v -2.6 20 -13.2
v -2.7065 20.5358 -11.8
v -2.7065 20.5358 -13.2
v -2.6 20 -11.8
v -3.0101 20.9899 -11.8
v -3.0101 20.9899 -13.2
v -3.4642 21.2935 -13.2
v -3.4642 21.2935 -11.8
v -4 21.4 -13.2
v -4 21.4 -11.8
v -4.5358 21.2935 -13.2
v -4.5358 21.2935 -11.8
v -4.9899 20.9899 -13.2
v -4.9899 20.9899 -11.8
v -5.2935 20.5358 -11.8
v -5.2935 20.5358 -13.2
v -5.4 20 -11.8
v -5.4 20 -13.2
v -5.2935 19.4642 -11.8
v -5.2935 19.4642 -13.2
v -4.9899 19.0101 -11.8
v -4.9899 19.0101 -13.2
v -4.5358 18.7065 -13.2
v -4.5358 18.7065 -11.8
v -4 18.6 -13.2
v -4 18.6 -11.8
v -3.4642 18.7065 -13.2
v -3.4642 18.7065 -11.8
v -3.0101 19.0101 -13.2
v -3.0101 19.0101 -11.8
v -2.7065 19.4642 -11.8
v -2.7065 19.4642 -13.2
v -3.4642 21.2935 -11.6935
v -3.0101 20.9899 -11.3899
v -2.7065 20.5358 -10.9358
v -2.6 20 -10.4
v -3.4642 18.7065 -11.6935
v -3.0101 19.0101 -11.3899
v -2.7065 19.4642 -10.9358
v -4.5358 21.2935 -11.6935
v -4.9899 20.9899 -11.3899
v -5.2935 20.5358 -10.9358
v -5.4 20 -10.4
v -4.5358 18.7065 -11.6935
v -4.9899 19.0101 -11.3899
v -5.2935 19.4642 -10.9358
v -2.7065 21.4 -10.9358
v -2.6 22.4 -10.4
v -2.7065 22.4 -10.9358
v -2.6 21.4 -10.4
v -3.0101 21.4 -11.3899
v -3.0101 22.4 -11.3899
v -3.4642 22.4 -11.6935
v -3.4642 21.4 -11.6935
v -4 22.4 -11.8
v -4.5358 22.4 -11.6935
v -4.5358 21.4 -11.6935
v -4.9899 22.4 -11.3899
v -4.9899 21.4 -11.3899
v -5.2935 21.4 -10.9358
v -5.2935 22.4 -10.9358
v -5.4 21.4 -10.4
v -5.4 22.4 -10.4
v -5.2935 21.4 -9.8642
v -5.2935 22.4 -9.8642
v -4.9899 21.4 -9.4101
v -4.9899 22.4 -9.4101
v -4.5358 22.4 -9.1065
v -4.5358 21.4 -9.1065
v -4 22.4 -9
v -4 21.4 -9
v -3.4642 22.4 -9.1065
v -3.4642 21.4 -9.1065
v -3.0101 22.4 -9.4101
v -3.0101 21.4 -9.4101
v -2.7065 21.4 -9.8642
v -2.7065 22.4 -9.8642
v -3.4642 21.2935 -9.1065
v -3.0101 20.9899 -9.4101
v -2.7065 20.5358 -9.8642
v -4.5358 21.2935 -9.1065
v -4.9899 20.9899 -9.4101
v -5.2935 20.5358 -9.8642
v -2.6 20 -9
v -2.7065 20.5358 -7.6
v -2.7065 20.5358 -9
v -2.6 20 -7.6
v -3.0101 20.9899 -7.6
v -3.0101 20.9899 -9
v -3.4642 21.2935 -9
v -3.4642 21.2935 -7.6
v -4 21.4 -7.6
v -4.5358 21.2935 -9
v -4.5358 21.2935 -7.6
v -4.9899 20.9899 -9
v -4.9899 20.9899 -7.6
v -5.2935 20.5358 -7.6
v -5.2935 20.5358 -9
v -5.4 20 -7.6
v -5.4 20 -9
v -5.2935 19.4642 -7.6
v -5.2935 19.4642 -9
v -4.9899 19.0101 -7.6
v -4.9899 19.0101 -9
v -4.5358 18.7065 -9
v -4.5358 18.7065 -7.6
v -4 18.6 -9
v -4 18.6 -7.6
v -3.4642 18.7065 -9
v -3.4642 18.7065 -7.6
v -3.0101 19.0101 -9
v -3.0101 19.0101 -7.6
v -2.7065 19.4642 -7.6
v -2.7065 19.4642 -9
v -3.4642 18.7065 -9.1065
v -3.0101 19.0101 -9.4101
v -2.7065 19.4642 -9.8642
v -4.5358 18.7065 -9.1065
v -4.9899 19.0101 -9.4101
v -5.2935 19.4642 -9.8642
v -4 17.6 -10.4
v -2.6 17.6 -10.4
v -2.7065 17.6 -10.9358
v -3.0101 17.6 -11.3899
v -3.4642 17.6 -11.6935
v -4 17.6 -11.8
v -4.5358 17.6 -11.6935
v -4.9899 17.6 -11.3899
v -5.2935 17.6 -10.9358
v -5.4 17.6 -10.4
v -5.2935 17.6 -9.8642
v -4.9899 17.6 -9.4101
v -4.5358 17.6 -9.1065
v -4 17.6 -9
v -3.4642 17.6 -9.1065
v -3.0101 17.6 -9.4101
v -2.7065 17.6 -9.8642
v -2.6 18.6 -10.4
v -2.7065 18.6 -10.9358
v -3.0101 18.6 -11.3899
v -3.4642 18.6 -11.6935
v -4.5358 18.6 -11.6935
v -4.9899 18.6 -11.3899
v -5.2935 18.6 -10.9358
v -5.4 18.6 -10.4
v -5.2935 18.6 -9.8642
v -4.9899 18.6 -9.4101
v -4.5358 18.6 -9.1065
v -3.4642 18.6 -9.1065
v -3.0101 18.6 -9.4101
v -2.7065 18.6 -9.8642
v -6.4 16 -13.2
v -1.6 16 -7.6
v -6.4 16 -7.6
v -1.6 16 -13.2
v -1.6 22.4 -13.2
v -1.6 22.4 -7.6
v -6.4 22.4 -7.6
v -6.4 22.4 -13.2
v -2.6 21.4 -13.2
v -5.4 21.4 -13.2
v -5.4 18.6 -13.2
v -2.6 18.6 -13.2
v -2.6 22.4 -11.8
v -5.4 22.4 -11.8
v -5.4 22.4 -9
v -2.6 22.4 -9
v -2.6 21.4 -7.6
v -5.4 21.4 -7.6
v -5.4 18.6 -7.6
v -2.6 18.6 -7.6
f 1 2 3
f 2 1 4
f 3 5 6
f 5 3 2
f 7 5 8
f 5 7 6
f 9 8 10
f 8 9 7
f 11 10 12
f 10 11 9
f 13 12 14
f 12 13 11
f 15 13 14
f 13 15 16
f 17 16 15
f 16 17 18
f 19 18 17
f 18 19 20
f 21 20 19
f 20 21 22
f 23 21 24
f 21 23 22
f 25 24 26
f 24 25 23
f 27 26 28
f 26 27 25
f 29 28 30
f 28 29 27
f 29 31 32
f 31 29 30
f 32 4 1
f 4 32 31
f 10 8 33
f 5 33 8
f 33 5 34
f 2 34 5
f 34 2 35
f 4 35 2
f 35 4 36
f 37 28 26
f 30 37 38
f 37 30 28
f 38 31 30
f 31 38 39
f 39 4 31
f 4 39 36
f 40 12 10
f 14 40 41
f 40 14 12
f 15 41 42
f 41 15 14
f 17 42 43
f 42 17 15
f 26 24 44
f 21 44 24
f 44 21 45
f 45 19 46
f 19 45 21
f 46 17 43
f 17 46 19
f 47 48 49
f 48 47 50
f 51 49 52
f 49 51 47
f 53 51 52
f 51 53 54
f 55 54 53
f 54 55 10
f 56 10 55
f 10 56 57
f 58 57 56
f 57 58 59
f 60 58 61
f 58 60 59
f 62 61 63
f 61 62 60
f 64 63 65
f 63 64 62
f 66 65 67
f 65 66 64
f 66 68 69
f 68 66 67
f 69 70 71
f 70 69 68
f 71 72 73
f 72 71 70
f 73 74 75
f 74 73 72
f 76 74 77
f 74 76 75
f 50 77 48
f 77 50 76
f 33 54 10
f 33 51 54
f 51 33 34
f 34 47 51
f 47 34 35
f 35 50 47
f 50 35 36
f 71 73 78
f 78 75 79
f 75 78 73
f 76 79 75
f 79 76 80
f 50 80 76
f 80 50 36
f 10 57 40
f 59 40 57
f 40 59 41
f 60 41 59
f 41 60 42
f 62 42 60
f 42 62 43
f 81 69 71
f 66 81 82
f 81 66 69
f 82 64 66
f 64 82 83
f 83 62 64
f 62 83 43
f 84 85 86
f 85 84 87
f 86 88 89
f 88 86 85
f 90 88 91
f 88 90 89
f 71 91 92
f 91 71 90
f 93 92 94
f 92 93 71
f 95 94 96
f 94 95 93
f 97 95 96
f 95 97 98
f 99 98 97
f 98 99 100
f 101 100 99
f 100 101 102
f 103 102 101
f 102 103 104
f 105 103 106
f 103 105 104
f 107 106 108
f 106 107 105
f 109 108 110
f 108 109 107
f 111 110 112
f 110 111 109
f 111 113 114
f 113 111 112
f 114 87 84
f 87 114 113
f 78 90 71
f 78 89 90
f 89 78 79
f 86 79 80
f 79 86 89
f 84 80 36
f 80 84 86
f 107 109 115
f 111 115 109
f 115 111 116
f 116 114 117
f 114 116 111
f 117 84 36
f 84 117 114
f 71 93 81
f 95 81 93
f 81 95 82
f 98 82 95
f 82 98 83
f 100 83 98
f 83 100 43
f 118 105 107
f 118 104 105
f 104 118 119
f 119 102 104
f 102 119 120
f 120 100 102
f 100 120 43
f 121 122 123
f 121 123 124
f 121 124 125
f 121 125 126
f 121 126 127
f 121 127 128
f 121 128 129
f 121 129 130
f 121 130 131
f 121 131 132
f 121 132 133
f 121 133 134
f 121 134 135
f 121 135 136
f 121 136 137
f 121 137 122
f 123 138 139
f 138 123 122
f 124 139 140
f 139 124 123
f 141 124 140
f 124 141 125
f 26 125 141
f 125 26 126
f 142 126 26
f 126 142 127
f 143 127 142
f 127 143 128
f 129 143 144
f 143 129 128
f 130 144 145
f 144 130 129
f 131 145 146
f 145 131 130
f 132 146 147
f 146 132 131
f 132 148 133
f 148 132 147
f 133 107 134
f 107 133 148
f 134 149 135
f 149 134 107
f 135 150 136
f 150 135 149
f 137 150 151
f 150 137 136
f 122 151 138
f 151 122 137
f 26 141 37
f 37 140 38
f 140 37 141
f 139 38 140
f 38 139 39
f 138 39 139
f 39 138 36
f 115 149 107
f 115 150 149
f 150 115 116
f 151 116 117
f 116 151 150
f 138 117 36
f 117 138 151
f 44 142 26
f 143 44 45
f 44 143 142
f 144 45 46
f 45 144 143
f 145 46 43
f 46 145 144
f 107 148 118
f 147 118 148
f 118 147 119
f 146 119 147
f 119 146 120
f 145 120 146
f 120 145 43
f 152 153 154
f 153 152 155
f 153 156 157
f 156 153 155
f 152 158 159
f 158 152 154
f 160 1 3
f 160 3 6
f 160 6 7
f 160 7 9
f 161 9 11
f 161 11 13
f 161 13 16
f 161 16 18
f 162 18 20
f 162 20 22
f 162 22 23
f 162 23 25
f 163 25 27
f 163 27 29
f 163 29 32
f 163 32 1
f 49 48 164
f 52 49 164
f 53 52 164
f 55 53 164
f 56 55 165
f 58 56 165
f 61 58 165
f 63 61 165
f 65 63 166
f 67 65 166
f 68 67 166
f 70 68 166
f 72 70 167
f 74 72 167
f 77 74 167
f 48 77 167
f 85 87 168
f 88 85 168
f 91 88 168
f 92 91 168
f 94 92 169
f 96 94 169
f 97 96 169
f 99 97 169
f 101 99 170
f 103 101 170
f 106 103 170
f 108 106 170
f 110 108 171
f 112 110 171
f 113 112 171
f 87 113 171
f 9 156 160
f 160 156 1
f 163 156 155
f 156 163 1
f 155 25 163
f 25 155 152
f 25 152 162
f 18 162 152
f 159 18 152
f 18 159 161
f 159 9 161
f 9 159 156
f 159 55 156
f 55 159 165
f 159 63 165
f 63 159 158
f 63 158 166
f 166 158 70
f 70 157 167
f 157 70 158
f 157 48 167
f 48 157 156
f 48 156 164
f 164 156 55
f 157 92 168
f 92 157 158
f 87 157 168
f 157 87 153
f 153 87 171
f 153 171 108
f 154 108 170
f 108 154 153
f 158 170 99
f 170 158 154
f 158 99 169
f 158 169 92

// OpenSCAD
// file: ../../p/box3u2p.scad
use <../lib.scad>
function ldraw_lib__box3u2p() = [
// 0 Box with 3 Faces without 2 Parallel Edges
// 0 Name: box3u2p.dat
// 0 Author: Niels Karsdorp [nielsk]
// 0 !LDRAW_ORG Primitive UPDATE 2012-01
// 0 !LICENSE Licensed under CC BY 4.0 : see CAreadme.txt
// 
// 0 BFC CERTIFY CCW
  [0,"BFC","CERTIFY"],
  [0,"BFC","CCW"],
// 
// 0 !HISTORY 2003-03-12 [PTadmin] Official Update 2003-01
// 0 !HISTORY 2007-06-24 [PTadmin] Header formatted for Contributor Agreement
// 0 !HISTORY 2008-07-01 [PTadmin] Official Update 2008-01
// 0 !HISTORY 2012-02-16 [Philo] Changed to CCW
// 0 !HISTORY 2012-03-30 [PTadmin] Official Update 2012-01
// 
// 
// 2 24 1 1 1 -1 1 1
  [2,24,1,1,1,-1,1,1],
// 2 24 -1 1 -1 1 1 -1
  [2,24,-1,1,-1,1,1,-1],
// 2 24 1 0 1 -1 0 1
  [2,24,1,0,1,-1,0,1],
// 2 24 -1 0 -1 1 0 -1
  [2,24,-1,0,-1,1,0,-1],
// 2 24 1 1 1 1 1 -1
  [2,24,1,1,1,1,1,-1],
// 2 24 -1 1 1 -1 1 -1
  [2,24,-1,1,1,-1,1,-1],
// 2 24 1 1 1 1 0 1
  [2,24,1,1,1,1,0,1],
// 2 24 1 1 -1 1 0 -1
  [2,24,1,1,-1,1,0,-1],
// 2 24 -1 1 1 -1 0 1
  [2,24,-1,1,1,-1,0,1],
// 2 24 -1 1 -1 -1 0 -1
  [2,24,-1,1,-1,-1,0,-1],
// 4 16 -1 1 -1 -1 1 1 1 1 1 1 1 -1
  [4,16,-1,1,-1,-1,1,1,1,1,1,1,1,-1],
// 4 16 -1 1 1 -1 0 1 1 0 1 1 1 1
  [4,16,-1,1,1,-1,0,1,1,0,1,1,1,1],
// 4 16 1 1 -1 1 0 -1 -1 0 -1 -1 1 -1
  [4,16,1,1,-1,1,0,-1,-1,0,-1,-1,1,-1],
];
module ldraw_lib__box3u2p(step=0, col=false, unit=2/5, alt=false, line=0.2, solid=!$preview)
    makepoly(ldraw_lib__box3u2p(), step=step, col=col, unit=unit, alt=alt, line=line, solid=solid);
ldraw_lib__box3u2p(line=0.2);
// file: ../../p/4-4ndis.scad
use <../lib.scad>
function ldraw_lib__4_4ndis() = [
// 0 Disc Negative 1.0
// 0 Name: 4-4ndis.dat
// 0 Author: James Jessiman
// 0 !LDRAW_ORG Primitive UPDATE 2012-01
// 0 !LICENSE Licensed under CC BY 4.0 : see CAreadme.txt
// 
// 0 BFC CERTIFY CCW
  [0,"BFC","CERTIFY"],
  [0,"BFC","CCW"],
// 
// 0 !HISTORY 2002-03-23 [sbliss] Added BFC statement; compacted code
// 0 !HISTORY 2002-04-25 [PTadmin] Official Update 2002-02
// 0 !HISTORY 2007-06-24 [PTadmin] Header formatted for Contributor Agreement
// 0 !HISTORY 2008-07-01 [PTadmin] Official Update 2008-01
// 0 !HISTORY 2012-02-16 [Philo] Changed to CCW
// 0 !HISTORY 2012-03-30 [PTadmin] Official Update 2012-01
// 
// 
// 3 16 0.9239 0 0.3827 1 0 0 1 0 1
  [3,16,0.9239,0,0.3827,1,0,0,1,0,1],
// 3 16 0.7071 0 0.7071 0.9239 0 0.3827 1 0 1
  [3,16,0.7071,0,0.7071,0.9239,0,0.3827,1,0,1],
// 3 16 0.3827 0 0.9239 0.7071 0 0.7071 1 0 1
  [3,16,0.3827,0,0.9239,0.7071,0,0.7071,1,0,1],
// 3 16 0 0 1 0.3827 0 0.9239 1 0 1
  [3,16,0,0,1,0.3827,0,0.9239,1,0,1],
// 3 16 -0.3827 0 0.9239 0 0 1 -1 0 1
  [3,16,-0.3827,0,0.9239,0,0,1,-1,0,1],
// 3 16 -0.7071 0 0.7071 -0.3827 0 0.9239 -1 0 1
  [3,16,-0.7071,0,0.7071,-0.3827,0,0.9239,-1,0,1],
// 3 16 -0.9239 0 0.3827 -0.7071 0 0.7071 -1 0 1
  [3,16,-0.9239,0,0.3827,-0.7071,0,0.7071,-1,0,1],
// 3 16 -1 0 0 -0.9239 0 0.3827 -1 0 1
  [3,16,-1,0,0,-0.9239,0,0.3827,-1,0,1],
// 3 16 -0.9239 0 -0.3827 -1 0 0 -1 0 -1
  [3,16,-0.9239,0,-0.3827,-1,0,0,-1,0,-1],
// 3 16 -0.7071 0 -0.7071 -0.9239 0 -0.3827 -1 0 -1
  [3,16,-0.7071,0,-0.7071,-0.9239,0,-0.3827,-1,0,-1],
// 3 16 -0.3827 0 -0.9239 -0.7071 0 -0.7071 -1 0 -1
  [3,16,-0.3827,0,-0.9239,-0.7071,0,-0.7071,-1,0,-1],
// 3 16 0 0 -1 -0.3827 0 -0.9239 -1 0 -1
  [3,16,0,0,-1,-0.3827,0,-0.9239,-1,0,-1],
// 3 16 0.3827 0 -0.9239 0 0 -1 1 0 -1
  [3,16,0.3827,0,-0.9239,0,0,-1,1,0,-1],
// 3 16 0.7071 0 -0.7071 0.3827 0 -0.9239 1 0 -1
  [3,16,0.7071,0,-0.7071,0.3827,0,-0.9239,1,0,-1],
// 3 16 0.9239 0 -0.3827 0.7071 0 -0.7071 1 0 -1
  [3,16,0.9239,0,-0.3827,0.7071,0,-0.7071,1,0,-1],
// 3 16 1 0 0 0.9239 0 -0.3827 1 0 -1
  [3,16,1,0,0,0.9239,0,-0.3827,1,0,-1],
];
module ldraw_lib__4_4ndis(step=0, col=false, unit=2/5, alt=false, line=0.2, solid=!$preview)
    makepoly(ldraw_lib__4_4ndis(), step=step, col=col, unit=unit, alt=alt, line=line, solid=solid);
ldraw_lib__4_4ndis(line=0.2);
// file: ../../p/4-4edge.scad
use <../lib.scad>
function ldraw_lib__4_4edge() = [
// 0 Circle 1.0
// 0 Name: 4-4edge.dat
// 0 Author: James Jessiman
// 0 !LDRAW_ORG Primitive UPDATE 2017-01
// 0 !LICENSE Licensed under CC BY 4.0 : see CAreadme.txt
// 
// 0 BFC CERTIFY CCW
  [0,"BFC","CERTIFY"],
  [0,"BFC","CCW"],
// 
// 0 !HISTORY 1998-12-15 [PTadmin] Official Update 1998-10
// 0 !HISTORY 2005-12-28 [PTadmin] Official Update 2005-01
// 0 !HISTORY 2007-06-24 [PTadmin] Header formatted for Contributor Agreement
// 0 !HISTORY 2008-07-01 [PTadmin] Official Update 2008-01
// 0 !HISTORY 2017-01-15 [Steffen] BFCed
// 0 !HISTORY 2017-12-30 [PTadmin] Official Update 2017-01
// 
// 
// 2 24 1 0 0 0.9239 0 0.3827
  [2,24,1,0,0,0.9239,0,0.3827],
// 2 24 0.9239 0 0.3827 0.7071 0 0.7071
  [2,24,0.9239,0,0.3827,0.7071,0,0.7071],
// 2 24 0.7071 0 0.7071 0.3827 0 0.9239
  [2,24,0.7071,0,0.7071,0.3827,0,0.9239],
// 2 24 0.3827 0 0.9239 0 0 1
  [2,24,0.3827,0,0.9239,0,0,1],
// 2 24 0 0 1 -0.3827 0 0.9239
  [2,24,0,0,1,-0.3827,0,0.9239],
// 2 24 -0.3827 0 0.9239 -0.7071 0 0.7071
  [2,24,-0.3827,0,0.9239,-0.7071,0,0.7071],
// 2 24 -0.7071 0 0.7071 -0.9239 0 0.3827
  [2,24,-0.7071,0,0.7071,-0.9239,0,0.3827],
// 2 24 -0.9239 0 0.3827 -1 0 -0
  [2,24,-0.9239,0,0.3827,-1,0,-0],
// 2 24 -1 0 -0 -0.9239 0 -0.3827
  [2,24,-1,0,-0,-0.9239,0,-0.3827],
// 2 24 -0.9239 0 -0.3827 -0.7071 0 -0.7071
  [2,24,-0.9239,0,-0.3827,-0.7071,0,-0.7071],
// 2 24 -0.7071 0 -0.7071 -0.3827 0 -0.9239
  [2,24,-0.7071,0,-0.7071,-0.3827,0,-0.9239],
// 2 24 -0.3827 0 -0.9239 0 0 -1
  [2,24,-0.3827,0,-0.9239,0,0,-1],
// 2 24 0 0 -1 0.3827 0 -0.9239
  [2,24,0,0,-1,0.3827,0,-0.9239],
// 2 24 0.3827 0 -0.9239 0.7071 0 -0.7071
  [2,24,0.3827,0,-0.9239,0.7071,0,-0.7071],
// 2 24 0.7071 0 -0.7071 0.9239 0 -0.3827
  [2,24,0.7071,0,-0.7071,0.9239,0,-0.3827],
// 2 24 0.9239 0 -0.3827 1 0 0
  [2,24,0.9239,0,-0.3827,1,0,0],
];
module ldraw_lib__4_4edge(step=0, col=false, unit=2/5, alt=false, line=0.2, solid=!$preview)
    makepoly(ldraw_lib__4_4edge(), step=step, col=col, unit=unit, alt=alt, line=line, solid=solid);
ldraw_lib__4_4edge(line=0.2);
// file: ../../p/4-4disc.scad
use <../lib.scad>
function ldraw_lib__4_4disc() = [
// 0 Disc 1.0
// 0 Name: 4-4disc.dat
// 0 Author: James Jessiman
// 0 !LDRAW_ORG Primitive UPDATE 2002-02
// 0 !LICENSE Licensed under CC BY 4.0 : see CAreadme.txt
// 
// 0 BFC CERTIFY CCW
  [0,"BFC","CERTIFY"],
  [0,"BFC","CCW"],
// 
// 0 !HISTORY 1998-12-15 [PTadmin] Official Update 1998-10
// 0 !HISTORY 2002-03-23 [sbliss] Added BFC statement
// 0 !HISTORY 2002-04-25 [PTadmin] Official Update 2002-02
// 0 !HISTORY 2007-06-24 [PTadmin] Header formatted for Contributor Agreement
// 0 !HISTORY 2008-07-01 [PTadmin] Official Update 2008-01
// 
// 
// 3 16 0 0 0 1 0 0 0.9239 0 0.3827
  [3,16,0,0,0,1,0,0,0.9239,0,0.3827],
// 3 16 0 0 0 0.9239 0 0.3827 0.7071 0 0.7071
  [3,16,0,0,0,0.9239,0,0.3827,0.7071,0,0.7071],
// 3 16 0 0 0 0.7071 0 0.7071 0.3827 0 0.9239
  [3,16,0,0,0,0.7071,0,0.7071,0.3827,0,0.9239],
// 3 16 0 0 0 0.3827 0 0.9239 0 0 1
  [3,16,0,0,0,0.3827,0,0.9239,0,0,1],
// 3 16 0 0 0 0 0 1 -0.3827 0 0.9239
  [3,16,0,0,0,0,0,1,-0.3827,0,0.9239],
// 3 16 0 0 0 -0.3827 0 0.9239 -0.7071 0 0.7071
  [3,16,0,0,0,-0.3827,0,0.9239,-0.7071,0,0.7071],
// 3 16 0 0 0 -0.7071 0 0.7071 -0.9239 0 0.3827
  [3,16,0,0,0,-0.7071,0,0.7071,-0.9239,0,0.3827],
// 3 16 0 0 0 -0.9239 0 0.3827 -1 0 -0
  [3,16,0,0,0,-0.9239,0,0.3827,-1,0,-0],
// 3 16 0 0 0 -1 0 -0 -0.9239 0 -0.3827
  [3,16,0,0,0,-1,0,-0,-0.9239,0,-0.3827],
// 3 16 0 0 0 -0.9239 0 -0.3827 -0.7071 0 -0.7071
  [3,16,0,0,0,-0.9239,0,-0.3827,-0.7071,0,-0.7071],
// 3 16 0 0 0 -0.7071 0 -0.7071 -0.3827 0 -0.9239
  [3,16,0,0,0,-0.7071,0,-0.7071,-0.3827,0,-0.9239],
// 3 16 0 0 0 -0.3827 0 -0.9239 0 0 -1
  [3,16,0,0,0,-0.3827,0,-0.9239,0,0,-1],
// 3 16 0 0 0 0 0 -1 0.3827 0 -0.9239
  [3,16,0,0,0,0,0,-1,0.3827,0,-0.9239],
// 3 16 0 0 0 0.3827 0 -0.9239 0.7071 0 -0.7071
  [3,16,0,0,0,0.3827,0,-0.9239,0.7071,0,-0.7071],
// 3 16 0 0 0 0.7071 0 -0.7071 0.9239 0 -0.3827
  [3,16,0,0,0,0.7071,0,-0.7071,0.9239,0,-0.3827],
// 3 16 0 0 0 0.9239 0 -0.3827 1 0 0
  [3,16,0,0,0,0.9239,0,-0.3827,1,0,0],
// 0
];
module ldraw_lib__4_4disc(step=0, col=false, unit=2/5, alt=false, line=0.2, solid=!$preview)
    makepoly(ldraw_lib__4_4disc(), step=step, col=col, unit=unit, alt=alt, line=line, solid=solid);
ldraw_lib__4_4disc(line=0.2);
// file: ../../p/4-4cyli.scad
use <../lib.scad>
function ldraw_lib__4_4cyli() = [
// 0 Cylinder 1.0
// 0 Name: 4-4cyli.dat
// 0 Author: James Jessiman
// 0 !LDRAW_ORG Primitive UPDATE 2005-01
// 0 !LICENSE Licensed under CC BY 4.0 : see CAreadme.txt
// 
// 0 BFC CERTIFY CCW
  [0,"BFC","CERTIFY"],
  [0,"BFC","CCW"],
// 
// 0 !HISTORY 1998-12-15 [PTadmin] Official Update 1998-10
// 0 !HISTORY 2002-03-23 [sbliss] Added BFC statement; merged headers from files in distributions LDraw 0.27 and Complete.
// 0 !HISTORY 2002-04-25 [PTadmin] Official Update 2002-02
// 0 !HISTORY 2004-12-14 [guyvivan] BFC CCW
// 0 !HISTORY 2005-12-28 [PTadmin] Official Update 2005-01
// 0 !HISTORY 2007-06-24 [PTadmin] Header formatted for Contributor Agreement
// 0 !HISTORY 2008-07-01 [PTadmin] Official Update 2008-01
// 
// 
// 4 16 1 1 0 0.9239 1 0.3827 0.9239 0 0.3827 1 0 0
  [4,16,1,1,0,0.9239,1,0.3827,0.9239,0,0.3827,1,0,0],
// 5 24 1 0 0 1 1 0 0.9239 0 0.3827 0.9239 0 -0.3827
  [5,24,1,0,0,1,1,0,0.9239,0,0.3827,0.9239,0,-0.3827],
// 4 16 0.9239 1 0.3827 0.7071 1 0.7071 0.7071 0 0.7071 0.9239 0 0.3827
  [4,16,0.9239,1,0.3827,0.7071,1,0.7071,0.7071,0,0.7071,0.9239,0,0.3827],
// 5 24 0.9239 0 0.3827 0.9239 1 0.3827 0.7071 0 0.7071 1 0 0
  [5,24,0.9239,0,0.3827,0.9239,1,0.3827,0.7071,0,0.7071,1,0,0],
// 4 16 0.7071 1 0.7071 0.3827 1 0.9239 0.3827 0 0.9239 0.7071 0 0.7071
  [4,16,0.7071,1,0.7071,0.3827,1,0.9239,0.3827,0,0.9239,0.7071,0,0.7071],
// 5 24 0.7071 0 0.7071 0.7071 1 0.7071 0.3827 0 0.9239 0.9239 0 0.3827
  [5,24,0.7071,0,0.7071,0.7071,1,0.7071,0.3827,0,0.9239,0.9239,0,0.3827],
// 4 16 0.3827 1 0.9239 0 1 1 0 0 1 0.3827 0 0.9239
  [4,16,0.3827,1,0.9239,0,1,1,0,0,1,0.3827,0,0.9239],
// 5 24 0.3827 0 0.9239 0.3827 1 0.9239 0 0 1 0.7071 0 0.7071
  [5,24,0.3827,0,0.9239,0.3827,1,0.9239,0,0,1,0.7071,0,0.7071],
// 4 16 0 1 1 -0.3827 1 0.9239 -0.3827 0 0.9239 0 0 1
  [4,16,0,1,1,-0.3827,1,0.9239,-0.3827,0,0.9239,0,0,1],
// 5 24 0 0 1 0 1 1 -0.3827 0 0.9239 0.3827 0 0.9239
  [5,24,0,0,1,0,1,1,-0.3827,0,0.9239,0.3827,0,0.9239],
// 4 16 -0.3827 1 0.9239 -0.7071 1 0.7071 -0.7071 0 0.7071 -0.3827 0 0.9239
  [4,16,-0.3827,1,0.9239,-0.7071,1,0.7071,-0.7071,0,0.7071,-0.3827,0,0.9239],
// 5 24 -0.3827 0 0.9239 -0.3827 1 0.9239 -0.7071 0 0.7071 0 0 1
  [5,24,-0.3827,0,0.9239,-0.3827,1,0.9239,-0.7071,0,0.7071,0,0,1],
// 4 16 -0.7071 1 0.7071 -0.9239 1 0.3827 -0.9239 0 0.3827 -0.7071 0 0.7071
  [4,16,-0.7071,1,0.7071,-0.9239,1,0.3827,-0.9239,0,0.3827,-0.7071,0,0.7071],
// 5 24 -0.7071 0 0.7071 -0.7071 1 0.7071 -0.9239 0 0.3827 -0.3827 0 0.9239
  [5,24,-0.7071,0,0.7071,-0.7071,1,0.7071,-0.9239,0,0.3827,-0.3827,0,0.9239],
// 4 16 -0.9239 1 0.3827 -1 1 0 -1 0 0 -0.9239 0 0.3827
  [4,16,-0.9239,1,0.3827,-1,1,0,-1,0,0,-0.9239,0,0.3827],
// 5 24 -0.9239 0 0.3827 -0.9239 1 0.3827 -1 0 0 -0.7071 0 0.7071
  [5,24,-0.9239,0,0.3827,-0.9239,1,0.3827,-1,0,0,-0.7071,0,0.7071],
// 4 16 -1 1 0 -0.9239 1 -0.3827 -0.9239 0 -0.3827 -1 0 0
  [4,16,-1,1,0,-0.9239,1,-0.3827,-0.9239,0,-0.3827,-1,0,0],
// 5 24 -1 0 0 -1 1 0 -0.9239 0 -0.3827 -0.9239 0 0.3827
  [5,24,-1,0,0,-1,1,0,-0.9239,0,-0.3827,-0.9239,0,0.3827],
// 4 16 -0.9239 1 -0.3827 -0.7071 1 -0.7071 -0.7071 0 -0.7071 -0.9239 0 -0.3827
  [4,16,-0.9239,1,-0.3827,-0.7071,1,-0.7071,-0.7071,0,-0.7071,-0.9239,0,-0.3827],
// 5 24 -0.9239 0 -0.3827 -0.9239 1 -0.3827 -0.7071 0 -0.7071 -1 0 0
  [5,24,-0.9239,0,-0.3827,-0.9239,1,-0.3827,-0.7071,0,-0.7071,-1,0,0],
// 4 16 -0.7071 1 -0.7071 -0.3827 1 -0.9239 -0.3827 0 -0.9239 -0.7071 0 -0.7071
  [4,16,-0.7071,1,-0.7071,-0.3827,1,-0.9239,-0.3827,0,-0.9239,-0.7071,0,-0.7071],
// 5 24 -0.7071 0 -0.7071 -0.7071 1 -0.7071 -0.3827 0 -0.9239 -0.9239 0 -0.3827
  [5,24,-0.7071,0,-0.7071,-0.7071,1,-0.7071,-0.3827,0,-0.9239,-0.9239,0,-0.3827],
// 4 16 -0.3827 1 -0.9239 0 1 -1 0 0 -1 -0.3827 0 -0.9239
  [4,16,-0.3827,1,-0.9239,0,1,-1,0,0,-1,-0.3827,0,-0.9239],
// 5 24 -0.3827 0 -0.9239 -0.3827 1 -0.9239 0 0 -1 -0.7071 0 -0.7071
  [5,24,-0.3827,0,-0.9239,-0.3827,1,-0.9239,0,0,-1,-0.7071,0,-0.7071],
// 4 16 0 1 -1 0.3827 1 -0.9239 0.3827 0 -0.9239 0 0 -1
  [4,16,0,1,-1,0.3827,1,-0.9239,0.3827,0,-0.9239,0,0,-1],
// 5 24 0 0 -1 0 1 -1 0.3827 0 -0.9239 -0.3827 0 -0.9239
  [5,24,0,0,-1,0,1,-1,0.3827,0,-0.9239,-0.3827,0,-0.9239],
// 4 16 0.3827 1 -0.9239 0.7071 1 -0.7071 0.7071 0 -0.7071 0.3827 0 -0.9239
  [4,16,0.3827,1,-0.9239,0.7071,1,-0.7071,0.7071,0,-0.7071,0.3827,0,-0.9239],
// 5 24 0.3827 0 -0.9239 0.3827 1 -0.9239 0.7071 0 -0.7071 0 0 -1
  [5,24,0.3827,0,-0.9239,0.3827,1,-0.9239,0.7071,0,-0.7071,0,0,-1],
// 4 16 0.7071 1 -0.7071 0.9239 1 -0.3827 0.9239 0 -0.3827 0.7071 0 -0.7071
  [4,16,0.7071,1,-0.7071,0.9239,1,-0.3827,0.9239,0,-0.3827,0.7071,0,-0.7071],
// 5 24 0.7071 0 -0.7071 0.7071 1 -0.7071 0.9239 0 -0.3827 0.3827 0 -0.9239
  [5,24,0.7071,0,-0.7071,0.7071,1,-0.7071,0.9239,0,-0.3827,0.3827,0,-0.9239],
// 4 16 0.9239 1 -0.3827 1 1 0 1 0 0 0.9239 0 -0.3827
  [4,16,0.9239,1,-0.3827,1,1,0,1,0,0,0.9239,0,-0.3827],
// 5 24 0.9239 0 -0.3827 0.9239 1 -0.3827 1 0 0 0.7071 0 -0.7071
  [5,24,0.9239,0,-0.3827,0.9239,1,-0.3827,1,0,0,0.7071,0,-0.7071],
// 0
];
module ldraw_lib__4_4cyli(step=0, col=false, unit=2/5, alt=false, line=0.2, solid=!$preview)
    makepoly(ldraw_lib__4_4cyli(), step=step, col=col, unit=unit, alt=alt, line=line, solid=solid);
ldraw_lib__4_4cyli(line=0.2);
// file: ../../p/1-4cyls.scad
use <../lib.scad>
function ldraw_lib__1_4cyls() = [
// 0 Cylinder Sloped 0.25
// 0 Name: 1-4cyls.dat
// 0 Author: James Jessiman
// 0 !LDRAW_ORG Primitive UPDATE 2012-01
// 0 !LICENSE Licensed under CC BY 4.0 : see CAreadme.txt
// 
// 0 BFC CERTIFY CCW
  [0,"BFC","CERTIFY"],
  [0,"BFC","CCW"],
// 
// 0 !HISTORY 1998-12-15 [PTadmin] Official Update 1998-10
// 0 !HISTORY 2002-07-03 [sbliss] Added BFC statement
// 0 !HISTORY 2002-08-18 [PTadmin] Official Update 2002-04
// 0 !HISTORY 2007-06-22 [PTadmin] Header formatted for Contributor Agreement
// 0 !HISTORY 2008-07-01 [PTadmin] Official Update 2008-01
// 0 !HISTORY 2012-02-16 [Philo] Changed to CCW
// 0 !HISTORY 2012-03-30 [PTadmin] Official Update 2012-01
// 
// 
// 3 16 0.9239 0.0761 0.3827 0.9239 0 0.3827 1 0 0
  [3,16,0.9239,0.0761,0.3827,0.9239,0,0.3827,1,0,0],
// 4 16 0.9239 0.0761 0.3827 0.7071 0.2929 0.7071 0.7071 0 0.7071 0.9239 0 0.3827
  [4,16,0.9239,0.0761,0.3827,0.7071,0.2929,0.7071,0.7071,0,0.7071,0.9239,0,0.3827],
// 4 16 0.7071 0.2929 0.7071 0.3827 0.6173 0.9239 0.3827 0 0.9239 0.7071 0 0.7071
  [4,16,0.7071,0.2929,0.7071,0.3827,0.6173,0.9239,0.3827,0,0.9239,0.7071,0,0.7071],
// 4 16 0.3827 0.6173 0.9239 0 1 1 0 0 1 0.3827 0 0.9239
  [4,16,0.3827,0.6173,0.9239,0,1,1,0,0,1,0.3827,0,0.9239],
// 
// 5 24 0.9239 0 0.3827 0.9239 0.0761 0.3827 0.7071 0 0.7071 1 0 0
  [5,24,0.9239,0,0.3827,0.9239,0.0761,0.3827,0.7071,0,0.7071,1,0,0],
// 5 24 0.7071 0 0.7071 0.7071 0.2929 0.7071 0.3827 0 0.9239 0.9239 0 0.3827
  [5,24,0.7071,0,0.7071,0.7071,0.2929,0.7071,0.3827,0,0.9239,0.9239,0,0.3827],
// 5 24 0.3827 0 0.9239 0.3827 0.6173 0.9239 0 0 1 0.7071 0 0.7071
  [5,24,0.3827,0,0.9239,0.3827,0.6173,0.9239,0,0,1,0.7071,0,0.7071],
// 5 24 0 0 1 0 1 1 0.3827 0 0.9239 -1 0 1
  [5,24,0,0,1,0,1,1,0.3827,0,0.9239,-1,0,1],
];
module ldraw_lib__1_4cyls(step=0, col=false, unit=2/5, alt=false, line=0.2, solid=!$preview)
    makepoly(ldraw_lib__1_4cyls(), step=step, col=col, unit=unit, alt=alt, line=line, solid=solid);
ldraw_lib__1_4cyls(line=0.2);
// main file
use <../../lib.scad>
use <../../p/1-4cyls.scad>
use <../../p/4-4cyli.scad>
use <../../p/4-4disc.scad>
use <../../p/4-4edge.scad>
use <../../p/4-4ndis.scad>
use <../../p/box3u2p.scad>
function ldraw_lib__s__u9626s01() = [
// 0 ~Electric Technic Motor Connector Half
// 0 Name: s\u9626s01.dat
// 0 Author: Rene Rechthaler [Blechtaler]
// 0 !LDRAW_ORG Subpart UPDATE 2024-08
// 0 !LICENSE Licensed under CC BY 4.0 : see CAreadme.txt
// 
// 0 BFC CERTIFY CCW
  [0,"BFC","CERTIFY"],
  [0,"BFC","CCW"],
// 
// 0 !HISTORY 2024-09-30 [OrionP] Official Update 2024-08
// 
// 0 // bottom part of the tube
// 1 16 -10 33 50 3.5 0 0 0 1 0 0 0 3.5 4-4edge.dat
  [1,16,-10,33,50,3.5,0,0,0,1,0,0,0,3.5, ldraw_lib__4_4edge()],
// 0 BFC INVERTNEXT
  [0,"BFC","INVERTNEXT"],
// 1 16 -10 33 50 3.5 0 0 0 -3.5 0 0 0 3.5 4-4cyli.dat
  [1,16,-10,33,50,3.5,0,0,0,-3.5,0,0,0,3.5, ldraw_lib__4_4cyli()],
// 0 BFC INVERTNEXT
  [0,"BFC","INVERTNEXT"],
// 1 16 -10 29.5 50 0 0 3.5 0 -3.5 0 3.5 0 0 1-4cyls.dat
  [1,16,-10,29.5,50,0,0,3.5,0,-3.5,0,3.5,0,0, ldraw_lib__1_4cyls()],
// 0 BFC INVERTNEXT
  [0,"BFC","INVERTNEXT"],
// 1 16 -10 29.5 50 0 0 3.5 0 -3.5 0 -3.5 0 0 1-4cyls.dat
  [1,16,-10,29.5,50,0,0,3.5,0,-3.5,0,-3.5,0,0, ldraw_lib__1_4cyls()],
// 0 BFC INVERTNEXT
  [0,"BFC","INVERTNEXT"],
// 1 16 -10 29.5 50 0 0 -3.5 0 -3.5 0 3.5 0 0 1-4cyls.dat
  [1,16,-10,29.5,50,0,0,-3.5,0,-3.5,0,3.5,0,0, ldraw_lib__1_4cyls()],
// 0 BFC INVERTNEXT
  [0,"BFC","INVERTNEXT"],
// 1 16 -10 29.5 50 0 0 -3.5 0 -3.5 0 -3.5 0 0 1-4cyls.dat
  [1,16,-10,29.5,50,0,0,-3.5,0,-3.5,0,-3.5,0,0, ldraw_lib__1_4cyls()],
// 0 // outer part of the tube
// 1 16 -10 26 56 3.5 0 0 0 0 3.5 0 1 0 4-4edge.dat
  [1,16,-10,26,56,3.5,0,0,0,0,3.5,0,1,0, ldraw_lib__4_4edge()],
// 0 BFC INVERTNEXT
  [0,"BFC","INVERTNEXT"],
// 1 16 -10 26 56 3.5 0 0 0 0 3.5 0 -2.5 0 4-4cyli.dat
  [1,16,-10,26,56,3.5,0,0,0,0,3.5,0,-2.5,0, ldraw_lib__4_4cyli()],
// 0 BFC INVERTNEXT
  [0,"BFC","INVERTNEXT"],
// 1 16 -10 26 53.5 0 0 3.5 3.5 0 0 0 -3.5 0 1-4cyls.dat
  [1,16,-10,26,53.5,0,0,3.5,3.5,0,0,0,-3.5,0, ldraw_lib__1_4cyls()],
// 0 BFC INVERTNEXT
  [0,"BFC","INVERTNEXT"],
// 1 16 -10 26 53.5 0 0 3.5 -3.5 0 0 0 -3.5 0 1-4cyls.dat
  [1,16,-10,26,53.5,0,0,3.5,-3.5,0,0,0,-3.5,0, ldraw_lib__1_4cyls()],
// 0 BFC INVERTNEXT
  [0,"BFC","INVERTNEXT"],
// 1 16 -10 26 53.5 0 0 -3.5 3.5 0 0 0 -3.5 0 1-4cyls.dat
  [1,16,-10,26,53.5,0,0,-3.5,3.5,0,0,0,-3.5,0, ldraw_lib__1_4cyls()],
// 0 BFC INVERTNEXT
  [0,"BFC","INVERTNEXT"],
// 1 16 -10 26 53.5 0 0 -3.5 -3.5 0 0 0 -3.5 0 1-4cyls.dat
  [1,16,-10,26,53.5,0,0,-3.5,-3.5,0,0,0,-3.5,0, ldraw_lib__1_4cyls()],
// 0 // top part of the tube
// 1 16 -10 19 50 3.5 0 0 0 1 0 0 0 3.5 4-4edge.dat
  [1,16,-10,19,50,3.5,0,0,0,1,0,0,0,3.5, ldraw_lib__4_4edge()],
// 0 BFC INVERTNEXT
  [0,"BFC","INVERTNEXT"],
// 1 16 -10 19 50 3.5 0 0 0 3.5 0 0 0 3.5 4-4cyli.dat
  [1,16,-10,19,50,3.5,0,0,0,3.5,0,0,0,3.5, ldraw_lib__4_4cyli()],
// 0 BFC INVERTNEXT
  [0,"BFC","INVERTNEXT"],
// 1 16 -10 22.5 50 0 0 3.5 0 3.5 0 3.5 0 0 1-4cyls.dat
  [1,16,-10,22.5,50,0,0,3.5,0,3.5,0,3.5,0,0, ldraw_lib__1_4cyls()],
// 0 BFC INVERTNEXT
  [0,"BFC","INVERTNEXT"],
// 1 16 -10 22.5 50 0 0 3.5 0 3.5 0 -3.5 0 0 1-4cyls.dat
  [1,16,-10,22.5,50,0,0,3.5,0,3.5,0,-3.5,0,0, ldraw_lib__1_4cyls()],
// 0 BFC INVERTNEXT
  [0,"BFC","INVERTNEXT"],
// 1 16 -10 22.5 50 0 0 -3.5 0 3.5 0 3.5 0 0 1-4cyls.dat
  [1,16,-10,22.5,50,0,0,-3.5,0,3.5,0,3.5,0,0, ldraw_lib__1_4cyls()],
// 0 BFC INVERTNEXT
  [0,"BFC","INVERTNEXT"],
// 1 16 -10 22.5 50 0 0 -3.5 0 3.5 0 -3.5 0 0 1-4cyls.dat
  [1,16,-10,22.5,50,0,0,-3.5,0,3.5,0,-3.5,0,0, ldraw_lib__1_4cyls()],
// 0 // inner part of the tube
// 1 16 -10 26 44 3.5 0 0 0 0 3.5 0 -1 0 4-4disc.dat
  [1,16,-10,26,44,3.5,0,0,0,0,3.5,0,-1,0, ldraw_lib__4_4disc()],
// 1 16 -10 26 44 3.5 0 0 0 0 3.5 0 1 0 4-4edge.dat
  [1,16,-10,26,44,3.5,0,0,0,0,3.5,0,1,0, ldraw_lib__4_4edge()],
// 0 BFC INVERTNEXT
  [0,"BFC","INVERTNEXT"],
// 1 16 -10 26 44 3.5 0 0 0 0 3.5 0 2.5 0 4-4cyli.dat
  [1,16,-10,26,44,3.5,0,0,0,0,3.5,0,2.5,0, ldraw_lib__4_4cyli()],
// 0 BFC INVERTNEXT
  [0,"BFC","INVERTNEXT"],
// 1 16 -10 26 46.5 0 0 3.5 3.5 0 0 0 3.5 0 1-4cyls.dat
  [1,16,-10,26,46.5,0,0,3.5,3.5,0,0,0,3.5,0, ldraw_lib__1_4cyls()],
// 0 BFC INVERTNEXT
  [0,"BFC","INVERTNEXT"],
// 1 16 -10 26 46.5 0 0 3.5 -3.5 0 0 0 3.5 0 1-4cyls.dat
  [1,16,-10,26,46.5,0,0,3.5,-3.5,0,0,0,3.5,0, ldraw_lib__1_4cyls()],
// 0 BFC INVERTNEXT
  [0,"BFC","INVERTNEXT"],
// 1 16 -10 26 46.5 0 0 -3.5 3.5 0 0 0 3.5 0 1-4cyls.dat
  [1,16,-10,26,46.5,0,0,-3.5,3.5,0,0,0,3.5,0, ldraw_lib__1_4cyls()],
// 0 BFC INVERTNEXT
  [0,"BFC","INVERTNEXT"],
// 1 16 -10 26 46.5 0 0 -3.5 -3.5 0 0 0 3.5 0 1-4cyls.dat
  [1,16,-10,26,46.5,0,0,-3.5,-3.5,0,0,0,3.5,0, ldraw_lib__1_4cyls()],
// 0 // diagonal edges
// 1 16 -10 26 50 3.5 0 0 0 1 3.5 0 0 3.5 4-4edge.dat
  [1,16,-10,26,50,3.5,0,0,0,1,3.5,0,0,3.5, ldraw_lib__4_4edge()],
// 1 16 -10 26 50 3.5 0 0 0 1 -3.5 0 0 3.5 4-4edge.dat
  [1,16,-10,26,50,3.5,0,0,0,1,-3.5,0,0,3.5, ldraw_lib__4_4edge()],
// 
// 0 // outer shell
// 1 16 -10 26 56 0 0 6 7 0 0 0 -16 0 box3u2p.dat
  [1,16,-10,26,56,0,0,6,7,0,0,0,-16,0, ldraw_lib__box3u2p()],
// 1 16 -10 33 50 3.5 0 0 0 -1 0 0 0 3.5 4-4ndis.dat
  [1,16,-10,33,50,3.5,0,0,0,-1,0,0,0,3.5, ldraw_lib__4_4ndis()],
// 1 16 -10 26 56 3.5 0 0 0 0 3.5 0 -1 0 4-4ndis.dat
  [1,16,-10,26,56,3.5,0,0,0,0,3.5,0,-1,0, ldraw_lib__4_4ndis()],
// 1 16 -10 19 50 3.5 0 0 0 1 0 0 0 3.5 4-4ndis.dat
  [1,16,-10,19,50,3.5,0,0,0,1,0,0,0,3.5, ldraw_lib__4_4ndis()],
// 2 24 -4 19 56 -16 19 56
  [2,24,-4,19,56,-16,19,56],
// 2 24 -4 33 56 -16 33 56
  [2,24,-4,33,56,-16,33,56],
// 
// 3 16 -10 33 53.5 -4 33 56 -6.5 33 53.5
  [3,16,-10,33,53.5,-4,33,56,-6.5,33,53.5],
// 3 16 -6.5 33 53.5 -4 33 56 -6.5 33 50
  [3,16,-6.5,33,53.5,-4,33,56,-6.5,33,50],
// 4 16 -6.5 33 46.5 -6.5 33 50 -4 33 56 -4 33 40
  [4,16,-6.5,33,46.5,-6.5,33,50,-4,33,56,-4,33,40],
// 4 16 -16 33 40 -10 33 46.5 -6.5 33 46.5 -4 33 40
  [4,16,-16,33,40,-10,33,46.5,-6.5,33,46.5,-4,33,40],
// 3 16 -10 33 46.5 -16 33 40 -13.5 33 46.5
  [3,16,-10,33,46.5,-16,33,40,-13.5,33,46.5],
// 3 16 -13.5 33 50 -13.5 33 46.5 -16 33 40
  [3,16,-13.5,33,50,-13.5,33,46.5,-16,33,40],
// 4 16 -16 33 40 -16 33 56 -13.5 33 53.5 -13.5 33 50
  [4,16,-16,33,40,-16,33,56,-13.5,33,53.5,-13.5,33,50],
// 4 16 -13.5 33 53.5 -16 33 56 -4 33 56 -10 33 53.5
  [4,16,-13.5,33,53.5,-16,33,56,-4,33,56,-10,33,53.5],
// 
// 4 16 -10 29.5 56 -4 33 56 -16 33 56 -13.5 29.5 56
  [4,16,-10,29.5,56,-4,33,56,-16,33,56,-13.5,29.5,56],
// 4 16 -16 33 56 -16 19 56 -13.5 26 56 -13.5 29.5 56
  [4,16,-16,33,56,-16,19,56,-13.5,26,56,-13.5,29.5,56],
// 3 16 -13.5 26 56 -16 19 56 -13.5 22.5 56
  [3,16,-13.5,26,56,-16,19,56,-13.5,22.5,56],
// 3 16 -13.5 22.5 56 -16 19 56 -10 22.5 56
  [3,16,-13.5,22.5,56,-16,19,56,-10,22.5,56],
// 4 16 -10 22.5 56 -16 19 56 -4 19 56 -6.5 22.5 56
  [4,16,-10,22.5,56,-16,19,56,-4,19,56,-6.5,22.5,56],
// 4 16 -4 19 56 -4 33 56 -6.5 26 56 -6.5 22.5 56
  [4,16,-4,19,56,-4,33,56,-6.5,26,56,-6.5,22.5,56],
// 3 16 -6.5 26 56 -4 33 56 -6.5 29.5 56
  [3,16,-6.5,26,56,-4,33,56,-6.5,29.5,56],
// 3 16 -6.5 29.5 56 -4 33 56 -10 29.5 56
  [3,16,-6.5,29.5,56,-4,33,56,-10,29.5,56],
// 
// 4 16 -6.5 19 53.5 -4 19 56 -16 19 56 -10 19 53.5
  [4,16,-6.5,19,53.5,-4,19,56,-16,19,56,-10,19,53.5],
// 4 16 -4 19 56 -6.5 19 53.5 -6.5 19 50 -4 19 40
  [4,16,-4,19,56,-6.5,19,53.5,-6.5,19,50,-4,19,40],
// 3 16 -4 19 40 -6.5 19 50 -6.5 19 46.5
  [3,16,-4,19,40,-6.5,19,50,-6.5,19,46.5],
// 3 16 -4 19 40 -6.5 19 46.5 -10 19 46.5
  [3,16,-4,19,40,-6.5,19,46.5,-10,19,46.5],
// 4 16 -4 19 40 -10 19 46.5 -13.5 19 46.5 -16 19 40
  [4,16,-4,19,40,-10,19,46.5,-13.5,19,46.5,-16,19,40],
// 4 16 -13.5 19 50 -16 19 56 -16 19 40 -13.5 19 46.5
  [4,16,-13.5,19,50,-16,19,56,-16,19,40,-13.5,19,46.5],
// 3 16 -16 19 56 -13.5 19 50 -13.5 19 53.5
  [3,16,-16,19,56,-13.5,19,50,-13.5,19,53.5],
// 3 16 -16 19 56 -13.5 19 53.5 -10 19 53.5
  [3,16,-16,19,56,-13.5,19,53.5,-10,19,53.5],
];
module ldraw_lib__s__u9626s01(step=0, col=false, unit=2/5, alt=false, line=0.2, solid=!$preview)
    makepoly(ldraw_lib__s__u9626s01(), step=step, col=col, unit=unit, alt=alt, line=line, solid=solid);
ldraw_lib__s__u9626s01(line=0.2);
